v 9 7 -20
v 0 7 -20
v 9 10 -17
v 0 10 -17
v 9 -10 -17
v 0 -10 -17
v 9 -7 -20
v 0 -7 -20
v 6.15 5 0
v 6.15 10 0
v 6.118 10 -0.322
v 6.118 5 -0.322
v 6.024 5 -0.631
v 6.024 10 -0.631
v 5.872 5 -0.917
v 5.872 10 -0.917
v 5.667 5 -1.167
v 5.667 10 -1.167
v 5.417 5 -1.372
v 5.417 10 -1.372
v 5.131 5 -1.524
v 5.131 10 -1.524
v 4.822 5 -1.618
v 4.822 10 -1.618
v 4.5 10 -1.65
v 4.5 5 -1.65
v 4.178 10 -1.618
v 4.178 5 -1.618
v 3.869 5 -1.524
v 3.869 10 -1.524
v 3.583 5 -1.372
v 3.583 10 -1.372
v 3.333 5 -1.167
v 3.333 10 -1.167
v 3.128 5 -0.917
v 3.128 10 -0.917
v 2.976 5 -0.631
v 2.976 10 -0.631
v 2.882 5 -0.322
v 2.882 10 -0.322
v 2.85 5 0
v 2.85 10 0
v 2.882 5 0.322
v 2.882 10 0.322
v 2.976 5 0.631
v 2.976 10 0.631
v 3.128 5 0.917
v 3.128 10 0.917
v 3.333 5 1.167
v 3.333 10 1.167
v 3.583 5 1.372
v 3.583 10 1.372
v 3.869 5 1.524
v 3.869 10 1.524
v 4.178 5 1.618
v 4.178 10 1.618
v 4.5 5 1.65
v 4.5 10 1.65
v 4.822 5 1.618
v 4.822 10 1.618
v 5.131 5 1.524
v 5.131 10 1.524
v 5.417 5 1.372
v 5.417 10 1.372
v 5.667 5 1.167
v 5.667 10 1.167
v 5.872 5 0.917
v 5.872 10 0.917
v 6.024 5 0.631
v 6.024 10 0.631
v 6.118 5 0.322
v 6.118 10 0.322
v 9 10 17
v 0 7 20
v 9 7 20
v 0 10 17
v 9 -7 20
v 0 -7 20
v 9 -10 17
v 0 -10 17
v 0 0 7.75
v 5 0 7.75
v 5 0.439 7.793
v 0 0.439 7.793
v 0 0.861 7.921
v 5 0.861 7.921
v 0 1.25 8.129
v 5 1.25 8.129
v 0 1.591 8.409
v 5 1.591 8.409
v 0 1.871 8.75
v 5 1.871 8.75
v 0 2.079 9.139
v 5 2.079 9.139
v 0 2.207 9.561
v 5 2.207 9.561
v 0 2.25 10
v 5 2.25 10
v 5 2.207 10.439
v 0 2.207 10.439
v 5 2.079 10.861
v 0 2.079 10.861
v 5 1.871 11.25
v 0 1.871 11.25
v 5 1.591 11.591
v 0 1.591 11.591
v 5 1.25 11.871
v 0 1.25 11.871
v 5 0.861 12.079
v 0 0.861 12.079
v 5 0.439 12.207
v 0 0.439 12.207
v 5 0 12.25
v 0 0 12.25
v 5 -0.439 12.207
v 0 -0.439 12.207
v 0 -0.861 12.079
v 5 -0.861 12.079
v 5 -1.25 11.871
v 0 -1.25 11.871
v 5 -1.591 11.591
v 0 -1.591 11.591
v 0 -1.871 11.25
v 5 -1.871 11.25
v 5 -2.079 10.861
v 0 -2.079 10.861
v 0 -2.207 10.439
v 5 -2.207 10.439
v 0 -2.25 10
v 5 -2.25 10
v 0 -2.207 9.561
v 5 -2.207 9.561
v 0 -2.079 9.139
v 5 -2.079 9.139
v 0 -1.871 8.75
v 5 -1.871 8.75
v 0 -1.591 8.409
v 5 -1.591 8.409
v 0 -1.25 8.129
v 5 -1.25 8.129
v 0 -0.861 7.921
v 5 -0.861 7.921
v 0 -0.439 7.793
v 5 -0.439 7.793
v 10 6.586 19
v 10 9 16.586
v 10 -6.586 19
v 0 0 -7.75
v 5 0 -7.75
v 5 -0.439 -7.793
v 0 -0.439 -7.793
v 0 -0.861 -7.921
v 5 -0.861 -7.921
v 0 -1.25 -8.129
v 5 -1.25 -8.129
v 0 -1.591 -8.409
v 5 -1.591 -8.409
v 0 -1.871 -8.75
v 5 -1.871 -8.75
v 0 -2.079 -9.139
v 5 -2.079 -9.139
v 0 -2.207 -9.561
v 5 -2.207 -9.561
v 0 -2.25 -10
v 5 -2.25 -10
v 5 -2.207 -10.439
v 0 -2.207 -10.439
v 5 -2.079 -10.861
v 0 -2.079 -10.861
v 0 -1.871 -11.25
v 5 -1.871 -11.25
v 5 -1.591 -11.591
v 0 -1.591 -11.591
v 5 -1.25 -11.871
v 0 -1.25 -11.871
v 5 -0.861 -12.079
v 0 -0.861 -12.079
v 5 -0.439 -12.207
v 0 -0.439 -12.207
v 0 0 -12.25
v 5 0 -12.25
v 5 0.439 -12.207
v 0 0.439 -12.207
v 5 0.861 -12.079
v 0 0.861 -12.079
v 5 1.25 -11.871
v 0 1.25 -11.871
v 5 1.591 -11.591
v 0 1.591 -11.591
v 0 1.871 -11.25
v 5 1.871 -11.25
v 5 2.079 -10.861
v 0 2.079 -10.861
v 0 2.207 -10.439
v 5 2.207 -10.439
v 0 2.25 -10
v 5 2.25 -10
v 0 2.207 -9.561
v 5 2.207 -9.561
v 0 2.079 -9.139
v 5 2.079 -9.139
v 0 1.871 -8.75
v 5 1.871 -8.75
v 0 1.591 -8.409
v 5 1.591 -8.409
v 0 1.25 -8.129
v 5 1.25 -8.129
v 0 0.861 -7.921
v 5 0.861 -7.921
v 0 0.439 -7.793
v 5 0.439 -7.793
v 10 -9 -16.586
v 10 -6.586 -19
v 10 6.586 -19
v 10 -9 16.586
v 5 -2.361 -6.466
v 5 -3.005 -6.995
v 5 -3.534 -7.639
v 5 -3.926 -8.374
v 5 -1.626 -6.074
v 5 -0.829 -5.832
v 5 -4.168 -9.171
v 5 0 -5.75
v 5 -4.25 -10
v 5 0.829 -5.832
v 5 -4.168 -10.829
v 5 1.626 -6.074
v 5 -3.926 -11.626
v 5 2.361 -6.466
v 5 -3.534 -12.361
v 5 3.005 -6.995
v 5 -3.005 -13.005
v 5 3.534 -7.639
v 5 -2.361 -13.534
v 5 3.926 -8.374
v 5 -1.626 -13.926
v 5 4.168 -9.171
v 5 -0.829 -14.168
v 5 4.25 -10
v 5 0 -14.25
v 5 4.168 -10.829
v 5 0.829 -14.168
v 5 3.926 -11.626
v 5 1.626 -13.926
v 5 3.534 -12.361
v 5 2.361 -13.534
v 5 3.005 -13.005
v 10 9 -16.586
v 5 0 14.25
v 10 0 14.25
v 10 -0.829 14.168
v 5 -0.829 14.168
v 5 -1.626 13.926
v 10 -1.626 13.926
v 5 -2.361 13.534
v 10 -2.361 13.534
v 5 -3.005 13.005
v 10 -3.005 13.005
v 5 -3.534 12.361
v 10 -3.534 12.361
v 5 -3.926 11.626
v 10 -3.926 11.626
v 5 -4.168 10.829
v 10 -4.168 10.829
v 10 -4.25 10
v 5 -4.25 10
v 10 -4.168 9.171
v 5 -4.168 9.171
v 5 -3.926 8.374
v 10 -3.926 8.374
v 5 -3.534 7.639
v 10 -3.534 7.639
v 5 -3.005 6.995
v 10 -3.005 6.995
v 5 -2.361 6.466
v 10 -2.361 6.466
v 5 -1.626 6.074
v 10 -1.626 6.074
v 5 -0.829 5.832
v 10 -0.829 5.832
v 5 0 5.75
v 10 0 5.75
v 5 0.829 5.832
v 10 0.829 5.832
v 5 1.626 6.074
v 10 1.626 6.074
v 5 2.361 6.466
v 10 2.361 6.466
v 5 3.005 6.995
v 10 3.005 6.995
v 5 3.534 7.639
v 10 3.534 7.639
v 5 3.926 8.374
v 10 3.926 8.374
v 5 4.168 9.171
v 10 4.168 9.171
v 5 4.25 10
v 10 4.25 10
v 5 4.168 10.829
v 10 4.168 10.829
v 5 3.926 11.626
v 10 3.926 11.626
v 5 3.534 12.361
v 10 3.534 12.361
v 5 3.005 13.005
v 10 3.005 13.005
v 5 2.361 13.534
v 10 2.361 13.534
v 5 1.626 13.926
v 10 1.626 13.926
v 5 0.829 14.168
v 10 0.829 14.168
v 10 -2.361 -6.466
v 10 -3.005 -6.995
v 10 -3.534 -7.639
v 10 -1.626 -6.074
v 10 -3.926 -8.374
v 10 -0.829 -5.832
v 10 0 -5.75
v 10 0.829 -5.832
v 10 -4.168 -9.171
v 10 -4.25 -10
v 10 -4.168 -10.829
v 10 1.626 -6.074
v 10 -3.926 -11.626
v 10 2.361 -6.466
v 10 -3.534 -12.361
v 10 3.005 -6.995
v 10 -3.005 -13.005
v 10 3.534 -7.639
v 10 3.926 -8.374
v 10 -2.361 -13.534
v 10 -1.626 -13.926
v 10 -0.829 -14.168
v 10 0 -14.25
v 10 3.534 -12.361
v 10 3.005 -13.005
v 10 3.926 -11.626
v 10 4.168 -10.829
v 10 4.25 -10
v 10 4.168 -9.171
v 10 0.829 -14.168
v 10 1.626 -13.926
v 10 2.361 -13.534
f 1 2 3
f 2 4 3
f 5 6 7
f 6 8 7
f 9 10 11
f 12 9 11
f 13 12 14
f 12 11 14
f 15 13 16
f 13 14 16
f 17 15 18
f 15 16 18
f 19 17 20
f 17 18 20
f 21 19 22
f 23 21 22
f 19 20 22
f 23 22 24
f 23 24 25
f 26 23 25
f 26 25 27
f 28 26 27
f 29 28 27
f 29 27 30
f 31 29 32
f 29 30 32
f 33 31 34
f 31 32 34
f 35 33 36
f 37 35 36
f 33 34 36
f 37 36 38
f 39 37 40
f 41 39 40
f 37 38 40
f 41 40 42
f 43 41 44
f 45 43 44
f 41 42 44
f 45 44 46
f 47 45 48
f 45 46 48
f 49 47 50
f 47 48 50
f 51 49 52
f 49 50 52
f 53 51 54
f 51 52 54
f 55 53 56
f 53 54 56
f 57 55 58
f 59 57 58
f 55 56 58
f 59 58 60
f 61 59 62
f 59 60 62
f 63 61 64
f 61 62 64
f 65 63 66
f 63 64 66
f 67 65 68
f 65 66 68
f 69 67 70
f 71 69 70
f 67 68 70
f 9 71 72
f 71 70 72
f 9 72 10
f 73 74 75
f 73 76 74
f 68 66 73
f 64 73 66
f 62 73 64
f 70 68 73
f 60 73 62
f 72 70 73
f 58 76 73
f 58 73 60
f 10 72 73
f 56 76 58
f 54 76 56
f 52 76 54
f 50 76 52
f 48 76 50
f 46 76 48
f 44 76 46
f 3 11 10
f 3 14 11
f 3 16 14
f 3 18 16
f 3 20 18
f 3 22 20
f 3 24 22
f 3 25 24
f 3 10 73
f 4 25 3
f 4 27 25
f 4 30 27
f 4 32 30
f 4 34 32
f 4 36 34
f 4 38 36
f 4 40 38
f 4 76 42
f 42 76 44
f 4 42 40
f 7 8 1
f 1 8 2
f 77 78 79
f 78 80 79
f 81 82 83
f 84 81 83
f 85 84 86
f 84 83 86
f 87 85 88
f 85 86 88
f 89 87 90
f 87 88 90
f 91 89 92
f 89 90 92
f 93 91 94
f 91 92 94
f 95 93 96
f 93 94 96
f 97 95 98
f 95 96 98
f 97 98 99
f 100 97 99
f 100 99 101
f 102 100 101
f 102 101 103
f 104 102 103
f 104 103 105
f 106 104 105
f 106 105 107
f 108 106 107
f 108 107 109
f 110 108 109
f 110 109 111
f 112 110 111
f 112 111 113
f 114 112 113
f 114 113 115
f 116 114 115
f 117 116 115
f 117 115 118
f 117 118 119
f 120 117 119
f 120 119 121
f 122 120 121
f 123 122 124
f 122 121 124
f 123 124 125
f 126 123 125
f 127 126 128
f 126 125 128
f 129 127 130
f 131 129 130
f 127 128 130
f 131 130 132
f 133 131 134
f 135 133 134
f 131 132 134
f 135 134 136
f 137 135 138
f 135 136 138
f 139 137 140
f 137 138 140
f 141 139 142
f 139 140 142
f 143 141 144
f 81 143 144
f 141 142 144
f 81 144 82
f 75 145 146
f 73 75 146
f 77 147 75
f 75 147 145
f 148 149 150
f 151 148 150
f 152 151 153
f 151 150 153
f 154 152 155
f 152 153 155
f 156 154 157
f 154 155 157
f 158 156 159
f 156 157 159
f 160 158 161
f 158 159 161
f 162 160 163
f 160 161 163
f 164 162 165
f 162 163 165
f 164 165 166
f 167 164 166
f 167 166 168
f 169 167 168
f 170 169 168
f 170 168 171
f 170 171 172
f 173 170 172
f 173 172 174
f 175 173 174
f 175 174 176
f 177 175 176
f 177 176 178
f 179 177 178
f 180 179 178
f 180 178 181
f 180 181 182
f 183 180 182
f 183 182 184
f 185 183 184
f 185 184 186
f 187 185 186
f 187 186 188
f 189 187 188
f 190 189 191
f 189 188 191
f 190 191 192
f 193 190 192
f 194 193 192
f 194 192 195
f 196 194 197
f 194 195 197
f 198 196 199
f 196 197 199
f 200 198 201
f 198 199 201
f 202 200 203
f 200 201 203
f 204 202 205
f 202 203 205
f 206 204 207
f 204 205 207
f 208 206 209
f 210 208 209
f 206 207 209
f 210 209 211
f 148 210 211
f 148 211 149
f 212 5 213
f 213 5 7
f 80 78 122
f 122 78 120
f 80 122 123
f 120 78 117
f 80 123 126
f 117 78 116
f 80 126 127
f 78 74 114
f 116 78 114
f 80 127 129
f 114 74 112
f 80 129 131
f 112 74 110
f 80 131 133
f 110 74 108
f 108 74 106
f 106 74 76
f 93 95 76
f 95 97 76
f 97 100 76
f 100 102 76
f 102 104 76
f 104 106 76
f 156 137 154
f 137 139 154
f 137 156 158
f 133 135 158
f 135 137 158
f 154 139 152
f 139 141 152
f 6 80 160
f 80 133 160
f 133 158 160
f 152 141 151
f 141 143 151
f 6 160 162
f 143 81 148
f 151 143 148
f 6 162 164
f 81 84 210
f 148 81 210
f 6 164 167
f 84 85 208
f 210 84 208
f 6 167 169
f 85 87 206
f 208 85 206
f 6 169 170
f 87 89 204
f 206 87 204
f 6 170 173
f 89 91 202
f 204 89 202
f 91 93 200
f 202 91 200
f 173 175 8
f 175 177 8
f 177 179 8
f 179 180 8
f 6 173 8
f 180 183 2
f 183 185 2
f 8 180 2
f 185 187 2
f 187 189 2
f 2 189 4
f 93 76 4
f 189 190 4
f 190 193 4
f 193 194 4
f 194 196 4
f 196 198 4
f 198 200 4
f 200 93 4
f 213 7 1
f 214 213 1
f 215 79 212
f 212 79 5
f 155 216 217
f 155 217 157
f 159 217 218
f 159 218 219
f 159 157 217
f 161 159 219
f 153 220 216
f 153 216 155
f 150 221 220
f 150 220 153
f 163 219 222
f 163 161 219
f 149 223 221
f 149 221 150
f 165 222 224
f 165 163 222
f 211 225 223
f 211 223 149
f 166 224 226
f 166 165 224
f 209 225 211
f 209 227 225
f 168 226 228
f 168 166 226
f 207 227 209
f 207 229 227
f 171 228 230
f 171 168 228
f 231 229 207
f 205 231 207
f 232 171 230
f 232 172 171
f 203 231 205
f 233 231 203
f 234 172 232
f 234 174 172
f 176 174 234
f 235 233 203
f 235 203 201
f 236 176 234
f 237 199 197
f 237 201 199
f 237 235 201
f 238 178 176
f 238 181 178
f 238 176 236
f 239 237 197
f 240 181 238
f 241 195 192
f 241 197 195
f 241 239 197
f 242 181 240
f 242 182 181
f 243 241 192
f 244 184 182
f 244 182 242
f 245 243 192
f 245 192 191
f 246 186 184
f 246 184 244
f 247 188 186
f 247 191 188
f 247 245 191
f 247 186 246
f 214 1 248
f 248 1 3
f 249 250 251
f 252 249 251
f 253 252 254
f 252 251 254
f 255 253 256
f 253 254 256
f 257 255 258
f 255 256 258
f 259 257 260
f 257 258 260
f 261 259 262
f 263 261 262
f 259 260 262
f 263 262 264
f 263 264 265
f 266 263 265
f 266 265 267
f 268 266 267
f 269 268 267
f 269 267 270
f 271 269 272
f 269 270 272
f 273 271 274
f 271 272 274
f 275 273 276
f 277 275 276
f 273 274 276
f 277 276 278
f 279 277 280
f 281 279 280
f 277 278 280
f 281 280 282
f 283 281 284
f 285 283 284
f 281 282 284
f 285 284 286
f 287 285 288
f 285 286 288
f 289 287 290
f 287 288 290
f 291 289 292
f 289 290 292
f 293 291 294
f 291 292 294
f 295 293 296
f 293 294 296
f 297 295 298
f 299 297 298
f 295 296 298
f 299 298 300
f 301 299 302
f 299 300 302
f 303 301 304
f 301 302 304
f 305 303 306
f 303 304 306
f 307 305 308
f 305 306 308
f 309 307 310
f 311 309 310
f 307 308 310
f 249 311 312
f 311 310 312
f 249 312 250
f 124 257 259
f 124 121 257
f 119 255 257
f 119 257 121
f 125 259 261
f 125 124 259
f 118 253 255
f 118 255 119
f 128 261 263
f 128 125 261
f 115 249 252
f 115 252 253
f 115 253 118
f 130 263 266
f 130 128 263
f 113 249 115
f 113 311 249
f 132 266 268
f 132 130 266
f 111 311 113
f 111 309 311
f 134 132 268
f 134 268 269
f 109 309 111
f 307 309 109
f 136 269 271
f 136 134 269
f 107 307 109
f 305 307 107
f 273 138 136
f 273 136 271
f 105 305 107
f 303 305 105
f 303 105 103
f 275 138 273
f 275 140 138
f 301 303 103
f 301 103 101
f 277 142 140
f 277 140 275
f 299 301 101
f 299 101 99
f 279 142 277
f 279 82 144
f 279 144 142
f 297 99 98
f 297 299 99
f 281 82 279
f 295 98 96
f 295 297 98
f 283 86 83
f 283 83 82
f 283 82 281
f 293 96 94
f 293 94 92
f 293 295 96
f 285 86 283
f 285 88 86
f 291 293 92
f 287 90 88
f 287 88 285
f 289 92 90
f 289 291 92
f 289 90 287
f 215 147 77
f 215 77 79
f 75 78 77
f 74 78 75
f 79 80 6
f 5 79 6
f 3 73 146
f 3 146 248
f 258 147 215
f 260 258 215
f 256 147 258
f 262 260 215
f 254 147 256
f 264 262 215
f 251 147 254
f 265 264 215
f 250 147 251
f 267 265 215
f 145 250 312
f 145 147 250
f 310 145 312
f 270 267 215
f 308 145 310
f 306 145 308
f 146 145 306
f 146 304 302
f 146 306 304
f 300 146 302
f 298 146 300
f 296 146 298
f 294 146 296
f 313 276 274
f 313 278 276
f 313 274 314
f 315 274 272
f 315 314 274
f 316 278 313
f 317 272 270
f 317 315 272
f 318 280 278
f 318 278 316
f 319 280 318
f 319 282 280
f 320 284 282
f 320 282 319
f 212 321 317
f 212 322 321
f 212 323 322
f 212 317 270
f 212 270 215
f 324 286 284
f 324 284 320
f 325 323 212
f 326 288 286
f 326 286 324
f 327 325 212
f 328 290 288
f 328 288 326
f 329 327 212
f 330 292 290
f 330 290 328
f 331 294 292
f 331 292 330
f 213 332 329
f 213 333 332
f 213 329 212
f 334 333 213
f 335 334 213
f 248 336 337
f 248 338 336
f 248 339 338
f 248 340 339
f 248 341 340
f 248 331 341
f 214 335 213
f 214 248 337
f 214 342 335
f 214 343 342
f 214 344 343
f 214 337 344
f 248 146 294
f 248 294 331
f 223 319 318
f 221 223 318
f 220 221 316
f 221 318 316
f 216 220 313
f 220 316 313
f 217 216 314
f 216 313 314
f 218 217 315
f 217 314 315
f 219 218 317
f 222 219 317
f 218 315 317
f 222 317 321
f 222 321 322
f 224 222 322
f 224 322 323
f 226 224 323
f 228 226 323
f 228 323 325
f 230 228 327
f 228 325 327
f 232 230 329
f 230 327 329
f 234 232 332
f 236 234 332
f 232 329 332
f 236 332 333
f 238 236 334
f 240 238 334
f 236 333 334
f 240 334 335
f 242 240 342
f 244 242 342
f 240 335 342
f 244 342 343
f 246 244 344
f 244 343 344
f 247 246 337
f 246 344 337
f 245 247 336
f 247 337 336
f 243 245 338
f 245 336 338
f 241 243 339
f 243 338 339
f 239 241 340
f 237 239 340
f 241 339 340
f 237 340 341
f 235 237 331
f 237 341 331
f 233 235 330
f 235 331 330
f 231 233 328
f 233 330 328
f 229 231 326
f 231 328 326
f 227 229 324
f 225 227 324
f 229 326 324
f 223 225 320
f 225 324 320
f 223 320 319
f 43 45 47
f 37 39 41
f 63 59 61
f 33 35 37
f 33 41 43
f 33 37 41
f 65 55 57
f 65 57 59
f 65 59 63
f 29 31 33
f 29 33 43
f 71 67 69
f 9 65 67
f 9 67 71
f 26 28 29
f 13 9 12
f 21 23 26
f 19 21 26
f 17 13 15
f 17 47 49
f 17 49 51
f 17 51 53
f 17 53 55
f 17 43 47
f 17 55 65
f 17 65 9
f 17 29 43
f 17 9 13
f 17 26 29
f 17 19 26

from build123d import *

# Parameters (mm, degrees)
SKETCH1_W           = 40
SKETCH1_H           = 20
BOSS_EXTRUDE1_DEPTH = 10
CHAMFER1_SIZE       = 3
CHAMFER2_SIZE       = 1
SKETCH2_R           = 2.25
CUT_EXTRUDE1_DEPTH  = 10
SKETCH2_3_R         = 4.25
SKETCH2_3_R_2       = 2.25
CUT_EXTRUDE2_DEPTH  = 5
SKETCH3_R           = 1.65
CUT_EXTRUDE3_DEPTH  = 5


with BuildPart() as part:
    # Sketch1 → Boss-Extrude1 (new body)
    with BuildSketch(Plane(origin=(0, 0, 0), x_dir=(0, 0, -1), z_dir=(1, 0, 0))):
        Rectangle(SKETCH1_W, SKETCH1_H)
    extrude(amount=BOSS_EXTRUDE1_DEPTH)

    # Chamfer1
    chamfer1_edges = [part.edges().sort_by_distance(p)[0] for p in [
        (5, 10, -20),
        (5, -10, -20),
        (5, -10, 20),
        (5, 10, 20),
    ]]
    chamfer(chamfer1_edges, length=CHAMFER1_SIZE)

    # Chamfer2
    chamfer2_edges = [part.edges().sort_by_distance(p)[0] for p in [
        (10, -8.5, -18.5),
        (10, -10, 0),
        (10, -8.5, 18.5),
        (10, 0, 20),
        (10, 8.5, 18.5),
        (10, 10, 0),
        (10, 8.5, -18.5),
        (10, 0, -20),
    ]]
    chamfer(chamfer2_edges, length=CHAMFER2_SIZE)

    # Sketch2 → Cut-Extrude1 (cut)
    with BuildSketch(Plane(origin=(10, 0, 0), x_dir=(0, 0, -1), z_dir=(1, 0, 0))):
        with Locations((-10, 0)):
            Circle(SKETCH2_R)
        with Locations((10, 0)):
            Circle(SKETCH2_R)
    extrude(amount=-CUT_EXTRUDE1_DEPTH, mode=Mode.SUBTRACT)

    # Sketch2<3> → Cut-Extrude2 (cut)
    # profile 1 of 2: a face of its own
    with BuildSketch(Plane(origin=(10, 0, 0), x_dir=(0, 0, -1), z_dir=(1, 0, 0))):
        with Locations((-10, 0)):
            Circle(SKETCH2_3_R)
        with Locations((-10, 0)):
            Circle(SKETCH2_3_R_2, mode=Mode.SUBTRACT)
    # profile 2 of 2: a face of its own
    with BuildSketch(Plane(origin=(10, 0, 0), x_dir=(0, 0, -1), z_dir=(1, 0, 0))):
        with Locations((10, 0)):
            Circle(SKETCH2_3_R)
        with Locations((10, 0)):
            Circle(SKETCH2_3_R_2, mode=Mode.SUBTRACT)
    extrude(amount=-CUT_EXTRUDE2_DEPTH, mode=Mode.SUBTRACT)

    # Sketch3 → Cut-Extrude3 (cut)
    with BuildSketch(Plane(origin=(0, 10, 0), x_dir=(1, 0, 0), z_dir=(0, 1, 0))):
        with Locations((4.5, 0)):
            Circle(SKETCH3_R)
    extrude(amount=-CUT_EXTRUDE3_DEPTH, mode=Mode.SUBTRACT)


solid = part.part
